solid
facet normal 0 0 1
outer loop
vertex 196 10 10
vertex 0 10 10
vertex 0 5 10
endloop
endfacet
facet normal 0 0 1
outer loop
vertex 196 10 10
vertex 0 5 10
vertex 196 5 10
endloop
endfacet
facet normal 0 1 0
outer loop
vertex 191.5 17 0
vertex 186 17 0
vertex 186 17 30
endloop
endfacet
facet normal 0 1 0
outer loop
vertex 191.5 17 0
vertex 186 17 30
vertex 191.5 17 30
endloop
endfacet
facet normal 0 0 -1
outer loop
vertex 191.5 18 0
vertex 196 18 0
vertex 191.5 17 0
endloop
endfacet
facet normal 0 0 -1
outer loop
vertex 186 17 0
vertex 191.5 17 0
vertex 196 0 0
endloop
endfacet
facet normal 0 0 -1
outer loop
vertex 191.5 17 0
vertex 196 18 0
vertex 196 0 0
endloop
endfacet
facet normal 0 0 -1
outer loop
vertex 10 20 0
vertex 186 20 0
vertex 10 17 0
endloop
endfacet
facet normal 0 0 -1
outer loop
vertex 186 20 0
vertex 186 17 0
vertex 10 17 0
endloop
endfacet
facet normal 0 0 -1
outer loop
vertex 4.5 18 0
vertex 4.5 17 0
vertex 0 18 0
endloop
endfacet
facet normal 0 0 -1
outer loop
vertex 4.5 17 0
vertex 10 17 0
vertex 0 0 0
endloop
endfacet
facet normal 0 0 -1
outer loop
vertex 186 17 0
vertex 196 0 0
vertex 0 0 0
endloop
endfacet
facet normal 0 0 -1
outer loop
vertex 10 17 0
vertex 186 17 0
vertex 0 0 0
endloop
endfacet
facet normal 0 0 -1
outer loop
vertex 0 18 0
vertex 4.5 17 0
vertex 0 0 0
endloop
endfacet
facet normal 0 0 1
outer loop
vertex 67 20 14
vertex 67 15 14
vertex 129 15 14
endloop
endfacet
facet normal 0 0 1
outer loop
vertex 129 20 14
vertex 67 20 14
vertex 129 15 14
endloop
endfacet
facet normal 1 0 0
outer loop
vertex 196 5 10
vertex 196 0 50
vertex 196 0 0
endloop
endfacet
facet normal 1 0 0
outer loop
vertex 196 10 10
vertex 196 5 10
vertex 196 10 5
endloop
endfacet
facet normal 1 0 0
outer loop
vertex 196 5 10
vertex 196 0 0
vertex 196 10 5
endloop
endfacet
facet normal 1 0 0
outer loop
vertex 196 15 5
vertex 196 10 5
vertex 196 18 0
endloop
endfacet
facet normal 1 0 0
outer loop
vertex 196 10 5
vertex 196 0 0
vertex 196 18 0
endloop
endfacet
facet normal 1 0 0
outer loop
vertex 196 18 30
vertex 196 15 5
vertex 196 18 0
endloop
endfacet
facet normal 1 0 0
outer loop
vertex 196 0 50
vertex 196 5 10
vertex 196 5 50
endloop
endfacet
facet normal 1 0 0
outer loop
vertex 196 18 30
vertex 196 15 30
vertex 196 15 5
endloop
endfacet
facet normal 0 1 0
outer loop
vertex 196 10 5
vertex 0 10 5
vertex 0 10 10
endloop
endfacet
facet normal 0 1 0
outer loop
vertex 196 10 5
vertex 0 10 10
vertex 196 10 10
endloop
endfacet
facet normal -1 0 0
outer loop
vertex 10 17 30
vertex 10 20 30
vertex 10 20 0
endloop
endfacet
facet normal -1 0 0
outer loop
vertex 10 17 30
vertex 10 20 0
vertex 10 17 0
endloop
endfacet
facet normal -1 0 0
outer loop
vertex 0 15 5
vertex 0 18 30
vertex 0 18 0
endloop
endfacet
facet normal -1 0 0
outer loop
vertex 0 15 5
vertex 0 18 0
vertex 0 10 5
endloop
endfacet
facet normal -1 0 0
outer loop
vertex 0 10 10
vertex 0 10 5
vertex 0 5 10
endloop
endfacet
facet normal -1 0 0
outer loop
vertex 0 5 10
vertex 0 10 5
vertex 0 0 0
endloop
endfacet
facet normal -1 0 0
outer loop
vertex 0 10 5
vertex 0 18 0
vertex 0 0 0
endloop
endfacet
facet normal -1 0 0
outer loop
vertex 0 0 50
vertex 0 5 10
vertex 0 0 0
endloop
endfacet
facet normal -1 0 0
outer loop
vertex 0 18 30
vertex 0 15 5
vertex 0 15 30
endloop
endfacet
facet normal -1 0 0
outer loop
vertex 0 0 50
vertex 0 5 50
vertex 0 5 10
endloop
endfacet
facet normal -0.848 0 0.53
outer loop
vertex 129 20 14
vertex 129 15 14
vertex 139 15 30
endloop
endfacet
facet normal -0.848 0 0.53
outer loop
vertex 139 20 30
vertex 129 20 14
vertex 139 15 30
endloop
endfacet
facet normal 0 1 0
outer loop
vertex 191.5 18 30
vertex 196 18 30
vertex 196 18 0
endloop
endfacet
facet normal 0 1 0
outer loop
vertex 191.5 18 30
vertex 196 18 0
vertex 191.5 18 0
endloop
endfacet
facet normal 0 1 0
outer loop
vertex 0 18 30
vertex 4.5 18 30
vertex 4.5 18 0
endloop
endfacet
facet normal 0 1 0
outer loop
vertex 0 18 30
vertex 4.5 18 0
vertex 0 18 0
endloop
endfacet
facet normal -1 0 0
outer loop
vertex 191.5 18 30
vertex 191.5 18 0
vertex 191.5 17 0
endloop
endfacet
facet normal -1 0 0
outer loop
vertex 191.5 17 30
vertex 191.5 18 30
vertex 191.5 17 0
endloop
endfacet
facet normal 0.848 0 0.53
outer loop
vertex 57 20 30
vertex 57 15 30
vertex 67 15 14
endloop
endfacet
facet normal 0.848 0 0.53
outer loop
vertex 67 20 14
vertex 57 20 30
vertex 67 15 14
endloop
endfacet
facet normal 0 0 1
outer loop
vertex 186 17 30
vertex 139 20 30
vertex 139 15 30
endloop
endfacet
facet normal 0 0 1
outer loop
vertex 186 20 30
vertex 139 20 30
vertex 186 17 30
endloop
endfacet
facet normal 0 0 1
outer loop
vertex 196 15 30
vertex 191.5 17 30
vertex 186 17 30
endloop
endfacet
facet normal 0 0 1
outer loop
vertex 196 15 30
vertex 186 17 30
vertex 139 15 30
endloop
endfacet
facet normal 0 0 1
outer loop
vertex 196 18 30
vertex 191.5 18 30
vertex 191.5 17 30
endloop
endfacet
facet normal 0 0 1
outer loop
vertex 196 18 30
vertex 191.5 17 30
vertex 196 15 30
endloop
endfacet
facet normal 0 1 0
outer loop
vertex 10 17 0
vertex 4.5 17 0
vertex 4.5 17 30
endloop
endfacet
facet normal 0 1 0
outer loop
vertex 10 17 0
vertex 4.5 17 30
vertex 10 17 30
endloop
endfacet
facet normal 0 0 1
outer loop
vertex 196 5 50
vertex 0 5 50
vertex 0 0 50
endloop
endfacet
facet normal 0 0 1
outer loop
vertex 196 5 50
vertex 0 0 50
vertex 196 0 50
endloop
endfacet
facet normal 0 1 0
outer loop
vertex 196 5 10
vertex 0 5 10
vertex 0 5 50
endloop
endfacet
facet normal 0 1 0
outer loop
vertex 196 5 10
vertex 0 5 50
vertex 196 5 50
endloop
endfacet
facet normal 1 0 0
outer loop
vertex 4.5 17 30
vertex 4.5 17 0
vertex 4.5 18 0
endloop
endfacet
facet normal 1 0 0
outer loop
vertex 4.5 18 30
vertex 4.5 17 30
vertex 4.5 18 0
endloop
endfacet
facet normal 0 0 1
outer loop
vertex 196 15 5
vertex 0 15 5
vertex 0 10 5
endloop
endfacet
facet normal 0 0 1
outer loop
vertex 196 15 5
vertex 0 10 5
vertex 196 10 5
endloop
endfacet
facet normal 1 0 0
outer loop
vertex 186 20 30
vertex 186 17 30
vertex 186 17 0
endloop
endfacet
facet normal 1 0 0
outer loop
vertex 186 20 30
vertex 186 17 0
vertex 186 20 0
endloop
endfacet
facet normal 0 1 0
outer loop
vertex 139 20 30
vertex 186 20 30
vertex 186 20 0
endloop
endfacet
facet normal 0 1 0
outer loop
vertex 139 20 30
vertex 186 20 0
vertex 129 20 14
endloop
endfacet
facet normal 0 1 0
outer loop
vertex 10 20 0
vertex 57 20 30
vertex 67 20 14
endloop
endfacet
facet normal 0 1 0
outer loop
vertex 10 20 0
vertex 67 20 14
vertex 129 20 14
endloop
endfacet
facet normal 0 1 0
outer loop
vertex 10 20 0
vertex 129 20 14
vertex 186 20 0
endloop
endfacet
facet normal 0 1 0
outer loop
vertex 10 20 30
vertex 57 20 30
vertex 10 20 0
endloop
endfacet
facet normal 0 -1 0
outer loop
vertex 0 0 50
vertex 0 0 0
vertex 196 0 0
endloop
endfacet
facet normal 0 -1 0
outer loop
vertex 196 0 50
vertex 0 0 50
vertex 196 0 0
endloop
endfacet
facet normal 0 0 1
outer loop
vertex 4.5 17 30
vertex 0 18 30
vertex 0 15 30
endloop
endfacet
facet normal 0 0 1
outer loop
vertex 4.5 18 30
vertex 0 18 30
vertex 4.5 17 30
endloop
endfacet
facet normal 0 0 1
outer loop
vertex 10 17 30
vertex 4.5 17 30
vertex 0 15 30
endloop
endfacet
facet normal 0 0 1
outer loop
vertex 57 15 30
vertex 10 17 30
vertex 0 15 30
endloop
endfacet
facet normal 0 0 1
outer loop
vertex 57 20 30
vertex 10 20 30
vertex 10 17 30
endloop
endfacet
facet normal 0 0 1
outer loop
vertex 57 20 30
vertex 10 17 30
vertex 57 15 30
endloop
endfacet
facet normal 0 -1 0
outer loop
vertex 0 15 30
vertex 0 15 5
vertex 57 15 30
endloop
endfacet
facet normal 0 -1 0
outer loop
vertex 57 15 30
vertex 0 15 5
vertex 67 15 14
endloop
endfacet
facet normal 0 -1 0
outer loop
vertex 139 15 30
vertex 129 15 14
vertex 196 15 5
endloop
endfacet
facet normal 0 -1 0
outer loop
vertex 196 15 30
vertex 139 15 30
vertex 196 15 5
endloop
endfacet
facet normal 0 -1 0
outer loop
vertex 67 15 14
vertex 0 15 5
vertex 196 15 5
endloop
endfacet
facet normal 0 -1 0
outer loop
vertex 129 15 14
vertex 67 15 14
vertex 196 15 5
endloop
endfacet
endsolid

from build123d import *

# Parameters (mm, degrees)
F0_W     = 196
F0_H     = 5
F1_DEPTH = 50
F2_W     = 196
F2_H     = 5
F3_DEPTH = 10
F4_W     = 196
F4_H     = 5
F5_DEPTH = 5
F6_W     = 5.5
F6_H     = 2
F7_DEPTH = 30
F9_DEPTH = 5


with BuildPart() as f1:
    # F0 (on Top) → F1 (new body)
    with BuildSketch(Plane.XY):
        with Locations((98, 2.5)):
            Rectangle(F0_W, F0_H)
    extrude(amount=F1_DEPTH)

    # F2 (on Top) → F3 (join)
    with BuildSketch(Plane.XY):
        with Locations((98, 7.5)):
            Rectangle(F2_W, F2_H)
    extrude(amount=F3_DEPTH)

    # F4 (on Top) → F5 (join)
    with BuildSketch(Plane.XY):
        with Locations((98, 12.5)):
            Rectangle(F4_W, F4_H)
    extrude(amount=F5_DEPTH)

    # F6 (on Top) → F7 (join)
    with BuildSketch(Plane.XY):
        Polygon((0, 18), (0, 15), (4.5, 15), (4.5, 17), (4.5, 18), align=None)
        with Locations((7.25, 16)):
            Rectangle(F6_W, F6_H)
        Polygon((10, 17), (10, 15), (57, 15), (57, 20), (10, 20), align=None)
        Polygon((191.5, 15), (196, 15), (196, 18), (191.5, 18), (191.5, 17), align=None)
        with Locations((188.75, 16)):
            Rectangle(F6_W, F6_H)
        Polygon((139, 15), (186, 15), (186, 17), (186, 20), (139, 20), align=None)
    extrude(amount=F7_DEPTH)

    # F8 (on face) → F9 (join)
    with BuildSketch(Plane(origin=(0, 15, 0), x_dir=(-1, 0, 0), z_dir=(0, 1, 0))):
        Polygon((-139, 0), (-57, 0), (-57, 14), (-67, 14), (-129, 14), (-139, 14), align=None)
        Polygon((-67, 14), (-57, 14), (-57, 30), align=None)
        Polygon((-139, 30), (-139, 14), (-129, 14), align=None)
    extrude(amount=F9_DEPTH)


solid = f1.part
